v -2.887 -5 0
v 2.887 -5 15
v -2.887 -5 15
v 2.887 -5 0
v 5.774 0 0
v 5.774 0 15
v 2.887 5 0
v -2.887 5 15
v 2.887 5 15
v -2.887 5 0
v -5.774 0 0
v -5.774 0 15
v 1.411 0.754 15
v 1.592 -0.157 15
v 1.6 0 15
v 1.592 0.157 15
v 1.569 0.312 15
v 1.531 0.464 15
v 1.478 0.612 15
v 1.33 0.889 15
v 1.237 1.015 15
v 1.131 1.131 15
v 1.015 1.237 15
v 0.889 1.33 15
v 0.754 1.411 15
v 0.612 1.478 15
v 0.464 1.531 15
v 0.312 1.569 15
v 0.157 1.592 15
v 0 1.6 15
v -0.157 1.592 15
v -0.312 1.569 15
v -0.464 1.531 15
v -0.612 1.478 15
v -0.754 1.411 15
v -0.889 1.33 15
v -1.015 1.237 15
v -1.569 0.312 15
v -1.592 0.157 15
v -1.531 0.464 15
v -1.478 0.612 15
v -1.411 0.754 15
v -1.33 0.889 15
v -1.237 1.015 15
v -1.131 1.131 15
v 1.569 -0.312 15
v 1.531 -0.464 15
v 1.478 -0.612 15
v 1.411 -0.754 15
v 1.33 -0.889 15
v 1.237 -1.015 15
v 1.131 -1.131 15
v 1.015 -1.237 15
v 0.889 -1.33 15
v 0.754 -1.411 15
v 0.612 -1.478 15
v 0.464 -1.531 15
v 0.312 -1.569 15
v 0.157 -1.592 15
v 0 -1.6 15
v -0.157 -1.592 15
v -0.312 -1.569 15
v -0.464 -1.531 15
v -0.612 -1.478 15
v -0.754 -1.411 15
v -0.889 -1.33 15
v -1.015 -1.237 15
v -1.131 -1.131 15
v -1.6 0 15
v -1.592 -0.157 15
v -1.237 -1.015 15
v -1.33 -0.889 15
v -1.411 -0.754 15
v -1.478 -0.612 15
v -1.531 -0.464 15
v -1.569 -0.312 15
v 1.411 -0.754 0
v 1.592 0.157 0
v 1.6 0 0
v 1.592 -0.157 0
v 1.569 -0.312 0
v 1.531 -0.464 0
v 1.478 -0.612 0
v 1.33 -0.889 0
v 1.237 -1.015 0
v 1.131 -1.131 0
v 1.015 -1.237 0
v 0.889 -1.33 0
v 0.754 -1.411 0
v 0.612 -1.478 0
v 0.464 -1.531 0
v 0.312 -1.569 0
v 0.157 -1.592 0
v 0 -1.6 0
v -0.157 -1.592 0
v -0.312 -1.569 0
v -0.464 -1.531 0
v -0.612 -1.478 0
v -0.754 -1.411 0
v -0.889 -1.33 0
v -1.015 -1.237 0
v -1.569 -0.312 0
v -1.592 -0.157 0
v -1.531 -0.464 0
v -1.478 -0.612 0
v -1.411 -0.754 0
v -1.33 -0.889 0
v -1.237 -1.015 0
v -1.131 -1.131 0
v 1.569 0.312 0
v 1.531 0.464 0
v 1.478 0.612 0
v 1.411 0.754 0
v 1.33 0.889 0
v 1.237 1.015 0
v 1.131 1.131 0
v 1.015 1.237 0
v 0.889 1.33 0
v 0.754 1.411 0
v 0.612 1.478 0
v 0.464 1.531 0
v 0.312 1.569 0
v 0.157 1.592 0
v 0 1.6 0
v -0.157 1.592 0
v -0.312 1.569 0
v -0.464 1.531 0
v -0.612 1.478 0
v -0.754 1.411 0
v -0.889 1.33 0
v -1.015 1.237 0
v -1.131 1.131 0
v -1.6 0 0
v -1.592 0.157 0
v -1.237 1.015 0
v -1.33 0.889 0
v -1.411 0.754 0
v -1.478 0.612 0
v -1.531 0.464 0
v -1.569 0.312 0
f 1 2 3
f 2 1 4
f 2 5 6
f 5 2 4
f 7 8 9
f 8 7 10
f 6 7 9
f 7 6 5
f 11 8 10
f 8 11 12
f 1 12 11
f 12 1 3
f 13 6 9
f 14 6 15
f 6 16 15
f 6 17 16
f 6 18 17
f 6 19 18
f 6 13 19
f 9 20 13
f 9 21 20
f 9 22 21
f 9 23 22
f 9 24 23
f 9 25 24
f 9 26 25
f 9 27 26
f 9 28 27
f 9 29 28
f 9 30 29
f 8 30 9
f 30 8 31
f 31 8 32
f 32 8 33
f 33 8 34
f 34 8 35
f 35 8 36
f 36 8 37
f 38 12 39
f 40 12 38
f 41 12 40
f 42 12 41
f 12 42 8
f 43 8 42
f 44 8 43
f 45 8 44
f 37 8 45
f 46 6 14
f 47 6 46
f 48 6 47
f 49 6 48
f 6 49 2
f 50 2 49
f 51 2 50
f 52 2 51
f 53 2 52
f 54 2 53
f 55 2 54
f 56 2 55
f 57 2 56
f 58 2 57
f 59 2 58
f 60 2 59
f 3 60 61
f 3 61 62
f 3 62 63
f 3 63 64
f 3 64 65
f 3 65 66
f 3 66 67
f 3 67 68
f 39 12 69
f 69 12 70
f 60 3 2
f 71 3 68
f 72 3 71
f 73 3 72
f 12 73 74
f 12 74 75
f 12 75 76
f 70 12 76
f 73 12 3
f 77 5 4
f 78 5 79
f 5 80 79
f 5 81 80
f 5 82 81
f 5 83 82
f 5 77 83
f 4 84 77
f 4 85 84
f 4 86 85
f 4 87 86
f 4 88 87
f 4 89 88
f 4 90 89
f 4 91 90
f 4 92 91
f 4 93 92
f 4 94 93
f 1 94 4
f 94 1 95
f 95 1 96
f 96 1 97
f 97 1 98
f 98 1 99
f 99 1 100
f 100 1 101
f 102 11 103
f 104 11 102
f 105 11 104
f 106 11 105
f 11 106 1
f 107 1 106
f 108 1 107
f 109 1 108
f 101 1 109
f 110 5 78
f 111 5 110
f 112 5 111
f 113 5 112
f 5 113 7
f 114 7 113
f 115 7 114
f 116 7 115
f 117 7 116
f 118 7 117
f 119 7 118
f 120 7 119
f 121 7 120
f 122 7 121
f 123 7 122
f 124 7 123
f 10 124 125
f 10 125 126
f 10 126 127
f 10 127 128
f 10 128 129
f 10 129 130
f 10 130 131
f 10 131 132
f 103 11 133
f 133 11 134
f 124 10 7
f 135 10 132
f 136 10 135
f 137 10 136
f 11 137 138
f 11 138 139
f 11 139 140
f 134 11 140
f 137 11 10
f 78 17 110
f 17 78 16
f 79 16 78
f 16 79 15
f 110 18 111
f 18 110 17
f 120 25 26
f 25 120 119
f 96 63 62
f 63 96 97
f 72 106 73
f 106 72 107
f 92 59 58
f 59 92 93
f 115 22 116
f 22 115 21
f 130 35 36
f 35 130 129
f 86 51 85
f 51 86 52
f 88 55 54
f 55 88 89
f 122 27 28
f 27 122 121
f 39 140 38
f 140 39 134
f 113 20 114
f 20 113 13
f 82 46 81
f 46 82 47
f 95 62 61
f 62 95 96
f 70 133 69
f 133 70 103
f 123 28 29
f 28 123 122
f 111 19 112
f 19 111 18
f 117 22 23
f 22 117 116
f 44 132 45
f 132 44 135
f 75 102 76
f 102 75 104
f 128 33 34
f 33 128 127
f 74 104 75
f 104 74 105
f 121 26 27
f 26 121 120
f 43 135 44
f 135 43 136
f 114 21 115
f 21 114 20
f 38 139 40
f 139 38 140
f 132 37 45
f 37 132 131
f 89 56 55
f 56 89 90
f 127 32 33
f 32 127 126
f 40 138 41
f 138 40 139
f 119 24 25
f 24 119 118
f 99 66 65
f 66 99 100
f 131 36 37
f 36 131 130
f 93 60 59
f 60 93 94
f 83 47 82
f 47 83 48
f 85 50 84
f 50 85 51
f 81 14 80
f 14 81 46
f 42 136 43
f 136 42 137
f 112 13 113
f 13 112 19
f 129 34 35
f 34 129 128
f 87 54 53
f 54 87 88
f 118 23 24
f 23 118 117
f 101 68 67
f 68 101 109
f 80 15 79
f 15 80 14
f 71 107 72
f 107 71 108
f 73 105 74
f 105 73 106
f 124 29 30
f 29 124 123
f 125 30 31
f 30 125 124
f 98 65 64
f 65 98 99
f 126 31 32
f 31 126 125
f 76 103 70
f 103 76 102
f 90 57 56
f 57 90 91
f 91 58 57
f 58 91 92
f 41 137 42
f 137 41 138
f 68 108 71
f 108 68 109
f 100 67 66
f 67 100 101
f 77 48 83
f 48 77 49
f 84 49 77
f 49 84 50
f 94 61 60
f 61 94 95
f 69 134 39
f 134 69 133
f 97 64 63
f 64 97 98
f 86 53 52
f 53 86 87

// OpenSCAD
// Hex standoff / spacer - a hexagonal prism with an axial through bore, for stacking
// boards or spacing panels. A NOVEL general part (not one of the 16 benchmark tasks).
//
// @desc hex standoff / spacer with an axial through bore
// @prompt Design a hex standoff in OpenSCAD: a hexagonal prism {af} mm across the flats and {length} mm long, with a {bore} mm diameter hole bored through its axis. Reply with a single complete OpenSCAD file.
// @param af      across-flats size, mm       [6:20]
// @param length  length, mm                  [6:40]
// @param bore    through-bore diameter, mm    [2:10]

af     = 10;
length = 15;
bore   = 3.2;

$fn = 64;

difference() {
    cylinder(h = length, d = af / cos(30), $fn = 6);     // hexagon: across-flats = d * cos(30)
    translate([0, 0, -1]) cylinder(h = length + 2, d = bore);
}
